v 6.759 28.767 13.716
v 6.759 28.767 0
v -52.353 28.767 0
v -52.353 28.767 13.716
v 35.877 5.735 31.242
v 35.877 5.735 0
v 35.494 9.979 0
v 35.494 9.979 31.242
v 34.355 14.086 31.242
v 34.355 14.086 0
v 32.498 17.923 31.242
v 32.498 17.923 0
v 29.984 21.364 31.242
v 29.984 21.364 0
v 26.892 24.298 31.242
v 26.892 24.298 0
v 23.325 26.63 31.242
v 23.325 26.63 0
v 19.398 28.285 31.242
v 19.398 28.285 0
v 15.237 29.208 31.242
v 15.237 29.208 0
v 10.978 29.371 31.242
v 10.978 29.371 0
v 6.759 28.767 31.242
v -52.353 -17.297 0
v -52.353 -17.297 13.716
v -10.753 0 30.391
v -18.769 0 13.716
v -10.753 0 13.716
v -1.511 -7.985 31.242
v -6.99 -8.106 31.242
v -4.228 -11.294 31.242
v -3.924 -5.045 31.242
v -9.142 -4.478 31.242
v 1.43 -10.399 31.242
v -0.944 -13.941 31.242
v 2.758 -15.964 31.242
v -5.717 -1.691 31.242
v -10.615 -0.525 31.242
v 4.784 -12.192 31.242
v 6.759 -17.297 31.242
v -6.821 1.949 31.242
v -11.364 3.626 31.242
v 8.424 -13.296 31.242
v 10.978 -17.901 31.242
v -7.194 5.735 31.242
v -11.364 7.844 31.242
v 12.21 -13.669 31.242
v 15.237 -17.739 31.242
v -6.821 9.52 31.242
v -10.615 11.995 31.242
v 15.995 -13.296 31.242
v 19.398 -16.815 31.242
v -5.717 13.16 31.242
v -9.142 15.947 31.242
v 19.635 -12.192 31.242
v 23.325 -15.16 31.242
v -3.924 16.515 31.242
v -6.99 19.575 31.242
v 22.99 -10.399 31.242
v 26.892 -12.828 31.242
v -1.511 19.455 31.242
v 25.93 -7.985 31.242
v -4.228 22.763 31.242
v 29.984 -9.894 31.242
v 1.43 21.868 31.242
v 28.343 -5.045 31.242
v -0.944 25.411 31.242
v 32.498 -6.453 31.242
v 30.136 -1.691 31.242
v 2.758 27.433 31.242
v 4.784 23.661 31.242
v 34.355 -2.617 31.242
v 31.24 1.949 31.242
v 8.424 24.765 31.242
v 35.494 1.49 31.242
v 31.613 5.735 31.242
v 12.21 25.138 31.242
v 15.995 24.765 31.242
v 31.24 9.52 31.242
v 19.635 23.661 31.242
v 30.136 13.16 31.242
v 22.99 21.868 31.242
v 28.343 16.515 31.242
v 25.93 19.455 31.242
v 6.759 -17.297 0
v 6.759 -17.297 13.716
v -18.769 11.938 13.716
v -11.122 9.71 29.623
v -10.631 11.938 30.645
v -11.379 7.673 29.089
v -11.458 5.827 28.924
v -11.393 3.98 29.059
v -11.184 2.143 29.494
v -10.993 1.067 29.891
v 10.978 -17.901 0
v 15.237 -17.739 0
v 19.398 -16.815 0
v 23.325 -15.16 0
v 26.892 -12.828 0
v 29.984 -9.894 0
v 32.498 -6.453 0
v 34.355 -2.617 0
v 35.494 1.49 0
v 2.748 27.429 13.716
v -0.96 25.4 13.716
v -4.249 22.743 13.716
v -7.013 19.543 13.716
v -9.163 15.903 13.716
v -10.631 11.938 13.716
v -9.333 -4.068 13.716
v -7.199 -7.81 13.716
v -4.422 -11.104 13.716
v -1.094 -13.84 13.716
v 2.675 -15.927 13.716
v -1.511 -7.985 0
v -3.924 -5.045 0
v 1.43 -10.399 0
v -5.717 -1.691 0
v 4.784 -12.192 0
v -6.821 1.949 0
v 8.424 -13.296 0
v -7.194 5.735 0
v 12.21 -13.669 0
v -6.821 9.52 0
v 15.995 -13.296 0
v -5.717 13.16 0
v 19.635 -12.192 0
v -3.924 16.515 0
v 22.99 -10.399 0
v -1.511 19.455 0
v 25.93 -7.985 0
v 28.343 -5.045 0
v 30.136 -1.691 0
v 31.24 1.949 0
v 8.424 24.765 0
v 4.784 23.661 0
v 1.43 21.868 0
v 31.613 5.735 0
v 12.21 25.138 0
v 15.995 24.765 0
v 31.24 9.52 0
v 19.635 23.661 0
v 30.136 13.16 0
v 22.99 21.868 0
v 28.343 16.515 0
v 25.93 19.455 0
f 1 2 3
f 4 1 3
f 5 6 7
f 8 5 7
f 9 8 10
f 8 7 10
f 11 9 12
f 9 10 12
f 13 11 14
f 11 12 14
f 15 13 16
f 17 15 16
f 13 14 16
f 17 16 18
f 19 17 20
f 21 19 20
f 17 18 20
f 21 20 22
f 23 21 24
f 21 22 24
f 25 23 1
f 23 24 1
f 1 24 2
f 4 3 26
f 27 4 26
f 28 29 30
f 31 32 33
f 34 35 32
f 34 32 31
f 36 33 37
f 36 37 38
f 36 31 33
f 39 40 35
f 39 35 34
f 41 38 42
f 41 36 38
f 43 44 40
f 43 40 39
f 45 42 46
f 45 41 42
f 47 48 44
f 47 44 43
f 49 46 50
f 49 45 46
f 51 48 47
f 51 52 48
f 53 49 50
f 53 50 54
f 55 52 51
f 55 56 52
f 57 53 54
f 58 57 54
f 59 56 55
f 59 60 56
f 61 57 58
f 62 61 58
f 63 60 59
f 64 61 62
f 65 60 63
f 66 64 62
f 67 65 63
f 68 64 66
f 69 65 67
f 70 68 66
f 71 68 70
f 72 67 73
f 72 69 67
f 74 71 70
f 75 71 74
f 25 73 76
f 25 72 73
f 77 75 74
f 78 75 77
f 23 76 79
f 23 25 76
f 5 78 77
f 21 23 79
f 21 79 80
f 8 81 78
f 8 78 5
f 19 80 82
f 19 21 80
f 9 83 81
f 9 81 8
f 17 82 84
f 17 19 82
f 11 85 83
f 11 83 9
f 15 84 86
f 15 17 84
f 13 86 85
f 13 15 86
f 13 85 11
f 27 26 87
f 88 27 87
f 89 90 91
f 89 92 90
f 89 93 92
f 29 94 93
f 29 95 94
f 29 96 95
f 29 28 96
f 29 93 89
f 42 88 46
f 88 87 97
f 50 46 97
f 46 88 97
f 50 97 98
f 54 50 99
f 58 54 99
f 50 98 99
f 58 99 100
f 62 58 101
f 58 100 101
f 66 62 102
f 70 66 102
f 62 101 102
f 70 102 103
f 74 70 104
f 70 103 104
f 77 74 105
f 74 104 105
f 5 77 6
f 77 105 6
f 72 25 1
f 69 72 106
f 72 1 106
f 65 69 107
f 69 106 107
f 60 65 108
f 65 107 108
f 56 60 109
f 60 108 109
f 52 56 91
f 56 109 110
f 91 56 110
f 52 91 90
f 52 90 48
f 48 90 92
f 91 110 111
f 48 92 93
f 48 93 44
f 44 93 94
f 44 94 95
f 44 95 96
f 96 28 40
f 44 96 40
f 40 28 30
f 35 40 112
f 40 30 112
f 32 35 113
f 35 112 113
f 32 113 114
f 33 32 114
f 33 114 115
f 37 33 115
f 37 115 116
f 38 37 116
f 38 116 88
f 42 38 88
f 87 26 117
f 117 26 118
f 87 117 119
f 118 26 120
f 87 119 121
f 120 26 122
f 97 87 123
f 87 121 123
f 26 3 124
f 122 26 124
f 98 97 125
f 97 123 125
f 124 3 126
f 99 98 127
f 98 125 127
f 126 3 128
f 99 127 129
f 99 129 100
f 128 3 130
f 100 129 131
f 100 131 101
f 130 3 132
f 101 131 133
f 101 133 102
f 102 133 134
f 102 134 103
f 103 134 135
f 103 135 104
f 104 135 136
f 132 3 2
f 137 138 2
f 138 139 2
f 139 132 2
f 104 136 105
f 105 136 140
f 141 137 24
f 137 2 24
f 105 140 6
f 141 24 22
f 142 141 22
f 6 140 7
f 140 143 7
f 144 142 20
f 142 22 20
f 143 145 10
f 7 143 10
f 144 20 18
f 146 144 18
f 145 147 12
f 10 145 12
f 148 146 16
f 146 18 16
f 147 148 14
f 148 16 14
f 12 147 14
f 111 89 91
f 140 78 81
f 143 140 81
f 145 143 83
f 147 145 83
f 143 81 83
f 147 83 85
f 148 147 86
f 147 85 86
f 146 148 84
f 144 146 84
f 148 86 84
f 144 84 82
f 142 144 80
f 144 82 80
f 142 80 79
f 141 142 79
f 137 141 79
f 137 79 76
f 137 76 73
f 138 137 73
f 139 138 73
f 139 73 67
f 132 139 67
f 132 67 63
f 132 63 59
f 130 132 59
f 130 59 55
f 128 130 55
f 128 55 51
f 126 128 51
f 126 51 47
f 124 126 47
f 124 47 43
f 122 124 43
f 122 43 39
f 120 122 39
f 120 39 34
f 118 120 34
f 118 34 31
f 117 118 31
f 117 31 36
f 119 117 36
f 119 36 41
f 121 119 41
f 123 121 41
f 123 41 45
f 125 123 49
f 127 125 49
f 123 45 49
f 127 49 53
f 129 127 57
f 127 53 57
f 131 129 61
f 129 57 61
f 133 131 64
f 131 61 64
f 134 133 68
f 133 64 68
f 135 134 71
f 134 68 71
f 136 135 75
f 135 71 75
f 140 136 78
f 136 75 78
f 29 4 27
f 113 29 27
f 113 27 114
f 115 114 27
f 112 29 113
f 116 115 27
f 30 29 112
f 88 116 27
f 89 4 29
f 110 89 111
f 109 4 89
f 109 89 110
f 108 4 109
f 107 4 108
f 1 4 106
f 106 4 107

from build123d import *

# Parameters (mm, degrees)
F1_DEPTH = 13.716
F2_DEPTH = 31.242
F3_R     = 19.40346
F4_DEPTH = 44.45
F6_DEPTH = 11.938


with BuildPart() as f1:
    # F0 (on Top) → F1 (new body)
    with BuildSketch(Plane.XY):
        with BuildLine():
            Line((6.759355, 28.766602), (-52.353363, 28.766602))
            Line((-52.353363, 28.766602), (-52.353363, -17.296961))
            Line((-52.353363, -17.296961), (6.759355, -17.296961))
            ThreePointArc((6.759355, -17.296961), (-11.458258, 5.734821), (6.759355, 28.766602))
        make_face()
    extrude(amount=F1_DEPTH)

    # F0 (on Top) → F2 (join)
    with BuildSketch(Plane.XY):
        with BuildLine():
            ThreePointArc((35.877493, 5.734821), (26.892468, 24.297747), (6.759355, 28.766602))
            Line((6.759355, 28.766602), (12.209618, 28.766602))
            Line((12.209618, 28.766602), (12.209618, -17.296961))
            Line((12.209618, -17.296961), (6.759355, -17.296961))
            ThreePointArc((6.759355, -17.296961), (26.892468, -12.828105), (35.877493, 5.734821))
        make_face()
        with BuildLine():
            Line((12.209618, 28.766602), (6.759355, 28.766602))
            ThreePointArc((6.759355, 28.766602), (-11.458258, 5.734821), (6.759355, -17.296961))
            Line((6.759355, -17.296961), (12.209618, -17.296961))
            Line((12.209618, -17.296961), (12.209618, 28.766602))
        make_face()
    extrude(amount=F2_DEPTH)

    # F3 (on face) → F4 (cut)
    with BuildSketch(Plane.XY.offset(31.242)):
        with Locations((12.209618, 5.734821)):
            Circle(F3_R)
    extrude(amount=-F4_DEPTH, mode=Mode.SUBTRACT)

    # F5 (on Front) → F6 (join)
    with BuildSketch(Plane.XZ):
        Polygon((-10.565767, 13.289291), (-10.565767, 30.780276), (-18.974263, 13.289291), align=None)
    extrude(amount=-F6_DEPTH)


solid = f1.part
